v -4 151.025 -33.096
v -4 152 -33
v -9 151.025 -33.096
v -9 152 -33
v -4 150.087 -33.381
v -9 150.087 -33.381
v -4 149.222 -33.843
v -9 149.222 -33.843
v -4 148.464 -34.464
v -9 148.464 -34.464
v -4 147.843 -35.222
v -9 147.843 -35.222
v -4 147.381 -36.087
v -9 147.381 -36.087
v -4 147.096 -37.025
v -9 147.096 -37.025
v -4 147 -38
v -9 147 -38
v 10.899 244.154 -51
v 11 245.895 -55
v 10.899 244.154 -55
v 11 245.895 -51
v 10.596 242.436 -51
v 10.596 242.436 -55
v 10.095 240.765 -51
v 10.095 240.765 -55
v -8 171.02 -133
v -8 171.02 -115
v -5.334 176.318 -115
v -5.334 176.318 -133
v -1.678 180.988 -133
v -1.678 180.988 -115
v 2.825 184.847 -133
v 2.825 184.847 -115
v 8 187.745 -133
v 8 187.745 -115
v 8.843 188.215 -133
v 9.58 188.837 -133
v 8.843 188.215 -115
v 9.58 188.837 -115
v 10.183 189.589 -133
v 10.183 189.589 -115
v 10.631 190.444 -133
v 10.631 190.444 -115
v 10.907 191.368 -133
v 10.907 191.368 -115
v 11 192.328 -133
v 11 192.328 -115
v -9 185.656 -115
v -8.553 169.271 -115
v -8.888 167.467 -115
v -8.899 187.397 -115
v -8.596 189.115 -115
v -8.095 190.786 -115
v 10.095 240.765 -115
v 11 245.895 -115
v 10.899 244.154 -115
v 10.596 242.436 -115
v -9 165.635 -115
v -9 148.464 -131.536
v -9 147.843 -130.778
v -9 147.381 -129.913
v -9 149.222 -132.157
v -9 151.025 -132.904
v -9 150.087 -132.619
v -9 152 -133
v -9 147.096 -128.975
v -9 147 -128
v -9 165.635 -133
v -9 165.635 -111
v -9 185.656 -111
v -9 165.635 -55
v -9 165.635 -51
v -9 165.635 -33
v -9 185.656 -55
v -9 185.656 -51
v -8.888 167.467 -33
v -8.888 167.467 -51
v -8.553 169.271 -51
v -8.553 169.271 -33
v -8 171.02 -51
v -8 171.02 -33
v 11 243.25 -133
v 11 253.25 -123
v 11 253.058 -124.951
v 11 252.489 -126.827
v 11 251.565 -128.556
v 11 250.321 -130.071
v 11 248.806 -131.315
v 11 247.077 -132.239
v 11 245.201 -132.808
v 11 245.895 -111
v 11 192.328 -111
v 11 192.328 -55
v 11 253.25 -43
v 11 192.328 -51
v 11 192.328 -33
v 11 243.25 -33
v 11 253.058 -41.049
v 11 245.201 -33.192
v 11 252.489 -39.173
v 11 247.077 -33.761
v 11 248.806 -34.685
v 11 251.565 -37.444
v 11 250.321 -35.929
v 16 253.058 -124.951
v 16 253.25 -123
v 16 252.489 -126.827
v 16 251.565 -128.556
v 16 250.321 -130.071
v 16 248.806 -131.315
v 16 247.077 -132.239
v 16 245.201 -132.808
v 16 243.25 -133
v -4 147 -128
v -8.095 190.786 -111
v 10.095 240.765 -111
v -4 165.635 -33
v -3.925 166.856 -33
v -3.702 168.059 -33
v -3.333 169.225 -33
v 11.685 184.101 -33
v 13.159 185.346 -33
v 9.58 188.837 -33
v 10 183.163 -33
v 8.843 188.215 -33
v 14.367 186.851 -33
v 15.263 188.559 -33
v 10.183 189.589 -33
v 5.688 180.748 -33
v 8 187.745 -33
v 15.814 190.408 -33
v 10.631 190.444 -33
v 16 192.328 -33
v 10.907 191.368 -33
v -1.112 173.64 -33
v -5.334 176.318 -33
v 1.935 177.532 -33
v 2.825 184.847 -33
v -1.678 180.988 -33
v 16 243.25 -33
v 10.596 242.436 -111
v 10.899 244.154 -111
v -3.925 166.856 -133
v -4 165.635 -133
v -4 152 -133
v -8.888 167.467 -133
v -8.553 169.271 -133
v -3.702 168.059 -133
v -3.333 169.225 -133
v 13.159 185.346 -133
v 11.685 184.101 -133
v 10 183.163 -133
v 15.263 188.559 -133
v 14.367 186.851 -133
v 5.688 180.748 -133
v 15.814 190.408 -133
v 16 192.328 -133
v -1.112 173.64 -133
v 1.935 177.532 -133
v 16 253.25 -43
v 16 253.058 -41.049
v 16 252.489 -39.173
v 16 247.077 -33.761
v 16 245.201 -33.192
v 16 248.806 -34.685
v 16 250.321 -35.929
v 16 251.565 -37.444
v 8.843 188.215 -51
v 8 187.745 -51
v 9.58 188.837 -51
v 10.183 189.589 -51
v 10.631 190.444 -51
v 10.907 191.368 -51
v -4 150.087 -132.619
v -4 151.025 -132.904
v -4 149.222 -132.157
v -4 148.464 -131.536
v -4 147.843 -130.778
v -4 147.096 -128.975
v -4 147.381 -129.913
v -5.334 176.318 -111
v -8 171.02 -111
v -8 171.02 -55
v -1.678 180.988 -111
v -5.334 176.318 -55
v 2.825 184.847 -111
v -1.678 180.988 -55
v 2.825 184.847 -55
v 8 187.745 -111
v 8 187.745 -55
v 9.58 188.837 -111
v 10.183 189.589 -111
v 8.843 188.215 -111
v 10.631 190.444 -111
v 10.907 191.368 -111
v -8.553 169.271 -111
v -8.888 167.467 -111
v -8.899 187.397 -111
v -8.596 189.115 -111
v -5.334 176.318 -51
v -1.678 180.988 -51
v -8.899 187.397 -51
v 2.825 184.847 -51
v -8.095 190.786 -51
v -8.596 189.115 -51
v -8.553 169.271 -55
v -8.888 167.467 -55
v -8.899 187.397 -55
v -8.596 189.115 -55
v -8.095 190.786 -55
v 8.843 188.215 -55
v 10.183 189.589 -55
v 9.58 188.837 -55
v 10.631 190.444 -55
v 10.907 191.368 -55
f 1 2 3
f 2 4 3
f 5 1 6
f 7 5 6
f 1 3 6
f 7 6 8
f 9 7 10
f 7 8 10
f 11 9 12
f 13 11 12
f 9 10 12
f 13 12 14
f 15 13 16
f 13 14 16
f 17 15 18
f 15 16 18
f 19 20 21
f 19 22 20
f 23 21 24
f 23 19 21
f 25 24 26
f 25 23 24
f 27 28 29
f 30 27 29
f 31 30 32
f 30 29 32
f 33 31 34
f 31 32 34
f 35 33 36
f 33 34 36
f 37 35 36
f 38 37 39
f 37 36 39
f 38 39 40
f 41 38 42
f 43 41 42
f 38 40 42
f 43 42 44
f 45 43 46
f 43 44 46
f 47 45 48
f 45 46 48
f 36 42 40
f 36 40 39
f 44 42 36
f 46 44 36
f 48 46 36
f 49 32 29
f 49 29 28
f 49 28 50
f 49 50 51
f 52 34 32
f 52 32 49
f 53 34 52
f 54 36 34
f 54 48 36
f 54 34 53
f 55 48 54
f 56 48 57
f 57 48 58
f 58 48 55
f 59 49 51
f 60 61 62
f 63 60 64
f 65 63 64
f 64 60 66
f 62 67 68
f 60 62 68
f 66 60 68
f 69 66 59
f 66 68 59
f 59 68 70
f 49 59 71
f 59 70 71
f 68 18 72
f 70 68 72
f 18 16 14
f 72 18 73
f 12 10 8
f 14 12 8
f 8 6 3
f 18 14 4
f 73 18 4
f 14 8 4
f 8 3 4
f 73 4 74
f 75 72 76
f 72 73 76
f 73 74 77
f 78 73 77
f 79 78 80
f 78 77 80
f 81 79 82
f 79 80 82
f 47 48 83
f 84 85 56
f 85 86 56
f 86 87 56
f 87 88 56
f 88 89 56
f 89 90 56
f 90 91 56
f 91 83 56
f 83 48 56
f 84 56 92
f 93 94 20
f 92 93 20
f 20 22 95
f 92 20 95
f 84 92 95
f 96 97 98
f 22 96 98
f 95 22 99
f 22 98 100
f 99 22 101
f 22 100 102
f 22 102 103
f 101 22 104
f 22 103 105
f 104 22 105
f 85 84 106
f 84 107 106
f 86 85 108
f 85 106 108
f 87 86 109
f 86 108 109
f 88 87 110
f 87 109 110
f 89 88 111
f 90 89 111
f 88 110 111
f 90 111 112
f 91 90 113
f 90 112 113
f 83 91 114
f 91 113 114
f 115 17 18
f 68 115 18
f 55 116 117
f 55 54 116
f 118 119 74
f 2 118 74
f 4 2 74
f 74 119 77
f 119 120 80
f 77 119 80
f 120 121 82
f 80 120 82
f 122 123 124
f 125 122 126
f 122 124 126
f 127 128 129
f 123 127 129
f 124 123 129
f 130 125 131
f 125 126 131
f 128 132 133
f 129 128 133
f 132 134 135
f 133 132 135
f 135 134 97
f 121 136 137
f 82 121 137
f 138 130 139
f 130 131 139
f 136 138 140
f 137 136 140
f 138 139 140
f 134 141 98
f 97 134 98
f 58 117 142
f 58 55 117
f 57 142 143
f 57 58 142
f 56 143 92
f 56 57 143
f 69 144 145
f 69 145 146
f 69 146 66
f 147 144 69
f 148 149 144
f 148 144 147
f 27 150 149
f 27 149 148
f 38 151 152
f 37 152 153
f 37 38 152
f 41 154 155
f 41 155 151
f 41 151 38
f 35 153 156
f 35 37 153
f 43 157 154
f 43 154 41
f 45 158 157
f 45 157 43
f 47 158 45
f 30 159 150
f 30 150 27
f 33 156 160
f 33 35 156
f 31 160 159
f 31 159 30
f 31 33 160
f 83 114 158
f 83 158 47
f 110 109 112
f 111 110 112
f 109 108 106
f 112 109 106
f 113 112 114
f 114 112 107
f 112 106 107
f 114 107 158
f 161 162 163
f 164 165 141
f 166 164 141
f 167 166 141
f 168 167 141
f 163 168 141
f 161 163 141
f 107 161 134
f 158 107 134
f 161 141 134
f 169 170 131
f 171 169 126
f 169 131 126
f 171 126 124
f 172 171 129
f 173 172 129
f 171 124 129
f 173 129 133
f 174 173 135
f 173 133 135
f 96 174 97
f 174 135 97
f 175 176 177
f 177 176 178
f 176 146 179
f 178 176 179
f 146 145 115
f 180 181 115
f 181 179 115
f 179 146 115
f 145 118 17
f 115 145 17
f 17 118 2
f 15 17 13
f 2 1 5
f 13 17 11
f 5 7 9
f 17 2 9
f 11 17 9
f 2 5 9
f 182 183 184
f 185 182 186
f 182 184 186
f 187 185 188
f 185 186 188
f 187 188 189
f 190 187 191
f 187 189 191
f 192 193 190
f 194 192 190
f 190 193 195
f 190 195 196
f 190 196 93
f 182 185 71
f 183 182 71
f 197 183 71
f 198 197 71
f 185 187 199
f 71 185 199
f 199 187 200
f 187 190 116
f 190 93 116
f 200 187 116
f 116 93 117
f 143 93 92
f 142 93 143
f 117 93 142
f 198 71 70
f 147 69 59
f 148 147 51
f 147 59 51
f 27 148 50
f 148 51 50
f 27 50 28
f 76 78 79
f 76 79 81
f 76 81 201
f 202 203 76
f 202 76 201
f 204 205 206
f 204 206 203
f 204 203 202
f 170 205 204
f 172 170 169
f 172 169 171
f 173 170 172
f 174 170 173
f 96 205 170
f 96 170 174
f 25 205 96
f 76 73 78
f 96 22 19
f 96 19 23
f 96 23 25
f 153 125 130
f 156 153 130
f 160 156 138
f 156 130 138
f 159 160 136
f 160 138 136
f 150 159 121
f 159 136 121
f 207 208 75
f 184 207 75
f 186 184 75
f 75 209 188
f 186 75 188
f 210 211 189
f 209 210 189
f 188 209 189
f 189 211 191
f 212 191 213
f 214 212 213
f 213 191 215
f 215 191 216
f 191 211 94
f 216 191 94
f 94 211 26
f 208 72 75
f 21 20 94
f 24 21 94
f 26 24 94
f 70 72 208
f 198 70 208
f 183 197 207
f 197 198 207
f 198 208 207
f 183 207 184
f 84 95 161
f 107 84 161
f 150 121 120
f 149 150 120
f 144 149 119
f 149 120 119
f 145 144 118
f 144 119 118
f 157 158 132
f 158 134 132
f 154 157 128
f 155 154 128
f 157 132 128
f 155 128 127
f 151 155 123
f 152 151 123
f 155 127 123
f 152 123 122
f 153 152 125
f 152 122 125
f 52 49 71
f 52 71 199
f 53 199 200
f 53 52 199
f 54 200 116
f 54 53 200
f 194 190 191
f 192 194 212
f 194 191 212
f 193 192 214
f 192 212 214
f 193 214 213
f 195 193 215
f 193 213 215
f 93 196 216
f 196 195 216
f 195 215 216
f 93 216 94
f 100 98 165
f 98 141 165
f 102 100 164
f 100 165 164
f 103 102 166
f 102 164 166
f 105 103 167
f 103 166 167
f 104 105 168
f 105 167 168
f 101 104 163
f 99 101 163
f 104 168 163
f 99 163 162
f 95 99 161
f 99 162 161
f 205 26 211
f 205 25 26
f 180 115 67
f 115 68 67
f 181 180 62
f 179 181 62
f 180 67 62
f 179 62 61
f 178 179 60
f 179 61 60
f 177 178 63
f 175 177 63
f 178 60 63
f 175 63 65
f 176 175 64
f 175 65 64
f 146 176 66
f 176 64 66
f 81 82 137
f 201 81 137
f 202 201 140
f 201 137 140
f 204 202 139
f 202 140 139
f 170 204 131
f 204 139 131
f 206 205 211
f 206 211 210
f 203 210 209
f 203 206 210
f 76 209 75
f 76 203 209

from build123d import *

# Parameters (mm, degrees)
BOSS_EXTRUDE1_DEPTH = 50
FILLET1_R           = 10
FILLET2_R           = 5
BOSS_EXTRUDE3_DEPTH = 2
BOSS_EXTRUDE4_DEPTH = 2


with BuildPart() as part:
    # Sketch2 → Boss-Extrude1 (new, symmetric)
    with BuildSketch(Plane.XY.offset(-83)):
        with BuildLine():
            Line((-4, 165.635164807), (-4, 147))
            Line((-4, 147), (-9, 147))
            Line((-9, 147), (-9, 165.635164807))
            ThreePointArc((-9, 165.635164807), (-8.747881204, 168.373777595), (-8, 171.020329614))
            ThreePointArc((-8, 171.020329614), (-1.677925359, 180.988070116), (8, 187.74545417))
            ThreePointArc((8, 187.74545417), (10.183300133, 189.589417077), (11, 192.328029865))
            Line((11, 192.328029865), (11, 253.25))
            Line((11, 253.25), (16, 253.25))
            Line((16, 253.25), (16, 192.328029865))
            ThreePointArc((16, 192.328029865), (14.366600265, 186.85080429), (10, 183.162878475))
            ThreePointArc((10, 183.162878475), (1.935062201, 177.531725097), (-3.333333333, 169.225274679))
            ThreePointArc((-3.333333333, 169.225274679), (-3.831920803, 167.460906665), (-4, 165.635164807))
        make_face()
    extrude(amount=BOSS_EXTRUDE1_DEPTH, both=True)

    # Fillet1
    fillet1_edges = [part.edges().sort_by_distance(p)[0] for p in [
        (13.5, 253.25, -133),
        (13.5, 253.25, -33),
    ]]
    fillet(fillet1_edges, radius=FILLET1_R)

    # Fillet2
    fillet2_edges = [part.edges().sort_by_distance(p)[0] for p in [
        (-6.5, 147, -133),
        (-6.5, 147, -33),
    ]]
    fillet(fillet2_edges, radius=FILLET2_R)

    # Sketch4 → Boss-Extrude3 (add, symmetric)
    with BuildSketch(Plane.XY.offset(-53)):
        with BuildLine():
            Line((10.095389312, 240.764602561), (-8.095389312, 190.78584905))
            ThreePointArc((-8.095389312, 190.78584905), (-8.772116295, 188.260269565), (-9, 185.6555469))
            Line((-9, 185.6555469), (-9, 165.635164807))
            ThreePointArc((-9, 165.635164807), (-8.747881204, 168.373777595), (-8, 171.020329614))
            ThreePointArc((-8, 171.020329614), (-1.677925359, 180.988070116), (8, 187.74545417))
            ThreePointArc((8, 187.74545417), (10.183300133, 189.589417077), (11, 192.328029865))
            Line((11, 192.328029865), (11, 245.894904711))
            ThreePointArc((11, 245.894904711), (10.772116295, 243.290182046), (10.095389312, 240.764602561))
        make_face()
    extrude(amount=BOSS_EXTRUDE3_DEPTH, both=True)

    # Sketch5 → Boss-Extrude4 (add, symmetric)
    with BuildSketch(Plane(origin=(0, 0, -113), x_dir=(-1, 0, 0), z_dir=(0, 0, -1))):
        with BuildLine():
            Line((-11, 245.894904711), (-11, 192.328029865))
            ThreePointArc((-11, 192.328029865), (-10.183300133, 189.589417077), (-8, 187.74545417))
            ThreePointArc((-8, 187.74545417), (1.677925359, 180.988070116), (8, 171.020329614))
            ThreePointArc((8, 171.020329614), (8.747881204, 168.373777595), (9, 165.635164807))
            Line((9, 165.635164807), (9, 185.6555469))
            ThreePointArc((9, 185.6555469), (8.772116295, 188.260269565), (8.095389312, 190.78584905))
            Line((8.095389312, 190.78584905), (-10.095389312, 240.764602561))
            ThreePointArc((-10.095389312, 240.764602561), (-10.772116295, 243.290182046), (-11, 245.894904711))
        make_face()
    extrude(amount=BOSS_EXTRUDE4_DEPTH, both=True)


solid = part.part
